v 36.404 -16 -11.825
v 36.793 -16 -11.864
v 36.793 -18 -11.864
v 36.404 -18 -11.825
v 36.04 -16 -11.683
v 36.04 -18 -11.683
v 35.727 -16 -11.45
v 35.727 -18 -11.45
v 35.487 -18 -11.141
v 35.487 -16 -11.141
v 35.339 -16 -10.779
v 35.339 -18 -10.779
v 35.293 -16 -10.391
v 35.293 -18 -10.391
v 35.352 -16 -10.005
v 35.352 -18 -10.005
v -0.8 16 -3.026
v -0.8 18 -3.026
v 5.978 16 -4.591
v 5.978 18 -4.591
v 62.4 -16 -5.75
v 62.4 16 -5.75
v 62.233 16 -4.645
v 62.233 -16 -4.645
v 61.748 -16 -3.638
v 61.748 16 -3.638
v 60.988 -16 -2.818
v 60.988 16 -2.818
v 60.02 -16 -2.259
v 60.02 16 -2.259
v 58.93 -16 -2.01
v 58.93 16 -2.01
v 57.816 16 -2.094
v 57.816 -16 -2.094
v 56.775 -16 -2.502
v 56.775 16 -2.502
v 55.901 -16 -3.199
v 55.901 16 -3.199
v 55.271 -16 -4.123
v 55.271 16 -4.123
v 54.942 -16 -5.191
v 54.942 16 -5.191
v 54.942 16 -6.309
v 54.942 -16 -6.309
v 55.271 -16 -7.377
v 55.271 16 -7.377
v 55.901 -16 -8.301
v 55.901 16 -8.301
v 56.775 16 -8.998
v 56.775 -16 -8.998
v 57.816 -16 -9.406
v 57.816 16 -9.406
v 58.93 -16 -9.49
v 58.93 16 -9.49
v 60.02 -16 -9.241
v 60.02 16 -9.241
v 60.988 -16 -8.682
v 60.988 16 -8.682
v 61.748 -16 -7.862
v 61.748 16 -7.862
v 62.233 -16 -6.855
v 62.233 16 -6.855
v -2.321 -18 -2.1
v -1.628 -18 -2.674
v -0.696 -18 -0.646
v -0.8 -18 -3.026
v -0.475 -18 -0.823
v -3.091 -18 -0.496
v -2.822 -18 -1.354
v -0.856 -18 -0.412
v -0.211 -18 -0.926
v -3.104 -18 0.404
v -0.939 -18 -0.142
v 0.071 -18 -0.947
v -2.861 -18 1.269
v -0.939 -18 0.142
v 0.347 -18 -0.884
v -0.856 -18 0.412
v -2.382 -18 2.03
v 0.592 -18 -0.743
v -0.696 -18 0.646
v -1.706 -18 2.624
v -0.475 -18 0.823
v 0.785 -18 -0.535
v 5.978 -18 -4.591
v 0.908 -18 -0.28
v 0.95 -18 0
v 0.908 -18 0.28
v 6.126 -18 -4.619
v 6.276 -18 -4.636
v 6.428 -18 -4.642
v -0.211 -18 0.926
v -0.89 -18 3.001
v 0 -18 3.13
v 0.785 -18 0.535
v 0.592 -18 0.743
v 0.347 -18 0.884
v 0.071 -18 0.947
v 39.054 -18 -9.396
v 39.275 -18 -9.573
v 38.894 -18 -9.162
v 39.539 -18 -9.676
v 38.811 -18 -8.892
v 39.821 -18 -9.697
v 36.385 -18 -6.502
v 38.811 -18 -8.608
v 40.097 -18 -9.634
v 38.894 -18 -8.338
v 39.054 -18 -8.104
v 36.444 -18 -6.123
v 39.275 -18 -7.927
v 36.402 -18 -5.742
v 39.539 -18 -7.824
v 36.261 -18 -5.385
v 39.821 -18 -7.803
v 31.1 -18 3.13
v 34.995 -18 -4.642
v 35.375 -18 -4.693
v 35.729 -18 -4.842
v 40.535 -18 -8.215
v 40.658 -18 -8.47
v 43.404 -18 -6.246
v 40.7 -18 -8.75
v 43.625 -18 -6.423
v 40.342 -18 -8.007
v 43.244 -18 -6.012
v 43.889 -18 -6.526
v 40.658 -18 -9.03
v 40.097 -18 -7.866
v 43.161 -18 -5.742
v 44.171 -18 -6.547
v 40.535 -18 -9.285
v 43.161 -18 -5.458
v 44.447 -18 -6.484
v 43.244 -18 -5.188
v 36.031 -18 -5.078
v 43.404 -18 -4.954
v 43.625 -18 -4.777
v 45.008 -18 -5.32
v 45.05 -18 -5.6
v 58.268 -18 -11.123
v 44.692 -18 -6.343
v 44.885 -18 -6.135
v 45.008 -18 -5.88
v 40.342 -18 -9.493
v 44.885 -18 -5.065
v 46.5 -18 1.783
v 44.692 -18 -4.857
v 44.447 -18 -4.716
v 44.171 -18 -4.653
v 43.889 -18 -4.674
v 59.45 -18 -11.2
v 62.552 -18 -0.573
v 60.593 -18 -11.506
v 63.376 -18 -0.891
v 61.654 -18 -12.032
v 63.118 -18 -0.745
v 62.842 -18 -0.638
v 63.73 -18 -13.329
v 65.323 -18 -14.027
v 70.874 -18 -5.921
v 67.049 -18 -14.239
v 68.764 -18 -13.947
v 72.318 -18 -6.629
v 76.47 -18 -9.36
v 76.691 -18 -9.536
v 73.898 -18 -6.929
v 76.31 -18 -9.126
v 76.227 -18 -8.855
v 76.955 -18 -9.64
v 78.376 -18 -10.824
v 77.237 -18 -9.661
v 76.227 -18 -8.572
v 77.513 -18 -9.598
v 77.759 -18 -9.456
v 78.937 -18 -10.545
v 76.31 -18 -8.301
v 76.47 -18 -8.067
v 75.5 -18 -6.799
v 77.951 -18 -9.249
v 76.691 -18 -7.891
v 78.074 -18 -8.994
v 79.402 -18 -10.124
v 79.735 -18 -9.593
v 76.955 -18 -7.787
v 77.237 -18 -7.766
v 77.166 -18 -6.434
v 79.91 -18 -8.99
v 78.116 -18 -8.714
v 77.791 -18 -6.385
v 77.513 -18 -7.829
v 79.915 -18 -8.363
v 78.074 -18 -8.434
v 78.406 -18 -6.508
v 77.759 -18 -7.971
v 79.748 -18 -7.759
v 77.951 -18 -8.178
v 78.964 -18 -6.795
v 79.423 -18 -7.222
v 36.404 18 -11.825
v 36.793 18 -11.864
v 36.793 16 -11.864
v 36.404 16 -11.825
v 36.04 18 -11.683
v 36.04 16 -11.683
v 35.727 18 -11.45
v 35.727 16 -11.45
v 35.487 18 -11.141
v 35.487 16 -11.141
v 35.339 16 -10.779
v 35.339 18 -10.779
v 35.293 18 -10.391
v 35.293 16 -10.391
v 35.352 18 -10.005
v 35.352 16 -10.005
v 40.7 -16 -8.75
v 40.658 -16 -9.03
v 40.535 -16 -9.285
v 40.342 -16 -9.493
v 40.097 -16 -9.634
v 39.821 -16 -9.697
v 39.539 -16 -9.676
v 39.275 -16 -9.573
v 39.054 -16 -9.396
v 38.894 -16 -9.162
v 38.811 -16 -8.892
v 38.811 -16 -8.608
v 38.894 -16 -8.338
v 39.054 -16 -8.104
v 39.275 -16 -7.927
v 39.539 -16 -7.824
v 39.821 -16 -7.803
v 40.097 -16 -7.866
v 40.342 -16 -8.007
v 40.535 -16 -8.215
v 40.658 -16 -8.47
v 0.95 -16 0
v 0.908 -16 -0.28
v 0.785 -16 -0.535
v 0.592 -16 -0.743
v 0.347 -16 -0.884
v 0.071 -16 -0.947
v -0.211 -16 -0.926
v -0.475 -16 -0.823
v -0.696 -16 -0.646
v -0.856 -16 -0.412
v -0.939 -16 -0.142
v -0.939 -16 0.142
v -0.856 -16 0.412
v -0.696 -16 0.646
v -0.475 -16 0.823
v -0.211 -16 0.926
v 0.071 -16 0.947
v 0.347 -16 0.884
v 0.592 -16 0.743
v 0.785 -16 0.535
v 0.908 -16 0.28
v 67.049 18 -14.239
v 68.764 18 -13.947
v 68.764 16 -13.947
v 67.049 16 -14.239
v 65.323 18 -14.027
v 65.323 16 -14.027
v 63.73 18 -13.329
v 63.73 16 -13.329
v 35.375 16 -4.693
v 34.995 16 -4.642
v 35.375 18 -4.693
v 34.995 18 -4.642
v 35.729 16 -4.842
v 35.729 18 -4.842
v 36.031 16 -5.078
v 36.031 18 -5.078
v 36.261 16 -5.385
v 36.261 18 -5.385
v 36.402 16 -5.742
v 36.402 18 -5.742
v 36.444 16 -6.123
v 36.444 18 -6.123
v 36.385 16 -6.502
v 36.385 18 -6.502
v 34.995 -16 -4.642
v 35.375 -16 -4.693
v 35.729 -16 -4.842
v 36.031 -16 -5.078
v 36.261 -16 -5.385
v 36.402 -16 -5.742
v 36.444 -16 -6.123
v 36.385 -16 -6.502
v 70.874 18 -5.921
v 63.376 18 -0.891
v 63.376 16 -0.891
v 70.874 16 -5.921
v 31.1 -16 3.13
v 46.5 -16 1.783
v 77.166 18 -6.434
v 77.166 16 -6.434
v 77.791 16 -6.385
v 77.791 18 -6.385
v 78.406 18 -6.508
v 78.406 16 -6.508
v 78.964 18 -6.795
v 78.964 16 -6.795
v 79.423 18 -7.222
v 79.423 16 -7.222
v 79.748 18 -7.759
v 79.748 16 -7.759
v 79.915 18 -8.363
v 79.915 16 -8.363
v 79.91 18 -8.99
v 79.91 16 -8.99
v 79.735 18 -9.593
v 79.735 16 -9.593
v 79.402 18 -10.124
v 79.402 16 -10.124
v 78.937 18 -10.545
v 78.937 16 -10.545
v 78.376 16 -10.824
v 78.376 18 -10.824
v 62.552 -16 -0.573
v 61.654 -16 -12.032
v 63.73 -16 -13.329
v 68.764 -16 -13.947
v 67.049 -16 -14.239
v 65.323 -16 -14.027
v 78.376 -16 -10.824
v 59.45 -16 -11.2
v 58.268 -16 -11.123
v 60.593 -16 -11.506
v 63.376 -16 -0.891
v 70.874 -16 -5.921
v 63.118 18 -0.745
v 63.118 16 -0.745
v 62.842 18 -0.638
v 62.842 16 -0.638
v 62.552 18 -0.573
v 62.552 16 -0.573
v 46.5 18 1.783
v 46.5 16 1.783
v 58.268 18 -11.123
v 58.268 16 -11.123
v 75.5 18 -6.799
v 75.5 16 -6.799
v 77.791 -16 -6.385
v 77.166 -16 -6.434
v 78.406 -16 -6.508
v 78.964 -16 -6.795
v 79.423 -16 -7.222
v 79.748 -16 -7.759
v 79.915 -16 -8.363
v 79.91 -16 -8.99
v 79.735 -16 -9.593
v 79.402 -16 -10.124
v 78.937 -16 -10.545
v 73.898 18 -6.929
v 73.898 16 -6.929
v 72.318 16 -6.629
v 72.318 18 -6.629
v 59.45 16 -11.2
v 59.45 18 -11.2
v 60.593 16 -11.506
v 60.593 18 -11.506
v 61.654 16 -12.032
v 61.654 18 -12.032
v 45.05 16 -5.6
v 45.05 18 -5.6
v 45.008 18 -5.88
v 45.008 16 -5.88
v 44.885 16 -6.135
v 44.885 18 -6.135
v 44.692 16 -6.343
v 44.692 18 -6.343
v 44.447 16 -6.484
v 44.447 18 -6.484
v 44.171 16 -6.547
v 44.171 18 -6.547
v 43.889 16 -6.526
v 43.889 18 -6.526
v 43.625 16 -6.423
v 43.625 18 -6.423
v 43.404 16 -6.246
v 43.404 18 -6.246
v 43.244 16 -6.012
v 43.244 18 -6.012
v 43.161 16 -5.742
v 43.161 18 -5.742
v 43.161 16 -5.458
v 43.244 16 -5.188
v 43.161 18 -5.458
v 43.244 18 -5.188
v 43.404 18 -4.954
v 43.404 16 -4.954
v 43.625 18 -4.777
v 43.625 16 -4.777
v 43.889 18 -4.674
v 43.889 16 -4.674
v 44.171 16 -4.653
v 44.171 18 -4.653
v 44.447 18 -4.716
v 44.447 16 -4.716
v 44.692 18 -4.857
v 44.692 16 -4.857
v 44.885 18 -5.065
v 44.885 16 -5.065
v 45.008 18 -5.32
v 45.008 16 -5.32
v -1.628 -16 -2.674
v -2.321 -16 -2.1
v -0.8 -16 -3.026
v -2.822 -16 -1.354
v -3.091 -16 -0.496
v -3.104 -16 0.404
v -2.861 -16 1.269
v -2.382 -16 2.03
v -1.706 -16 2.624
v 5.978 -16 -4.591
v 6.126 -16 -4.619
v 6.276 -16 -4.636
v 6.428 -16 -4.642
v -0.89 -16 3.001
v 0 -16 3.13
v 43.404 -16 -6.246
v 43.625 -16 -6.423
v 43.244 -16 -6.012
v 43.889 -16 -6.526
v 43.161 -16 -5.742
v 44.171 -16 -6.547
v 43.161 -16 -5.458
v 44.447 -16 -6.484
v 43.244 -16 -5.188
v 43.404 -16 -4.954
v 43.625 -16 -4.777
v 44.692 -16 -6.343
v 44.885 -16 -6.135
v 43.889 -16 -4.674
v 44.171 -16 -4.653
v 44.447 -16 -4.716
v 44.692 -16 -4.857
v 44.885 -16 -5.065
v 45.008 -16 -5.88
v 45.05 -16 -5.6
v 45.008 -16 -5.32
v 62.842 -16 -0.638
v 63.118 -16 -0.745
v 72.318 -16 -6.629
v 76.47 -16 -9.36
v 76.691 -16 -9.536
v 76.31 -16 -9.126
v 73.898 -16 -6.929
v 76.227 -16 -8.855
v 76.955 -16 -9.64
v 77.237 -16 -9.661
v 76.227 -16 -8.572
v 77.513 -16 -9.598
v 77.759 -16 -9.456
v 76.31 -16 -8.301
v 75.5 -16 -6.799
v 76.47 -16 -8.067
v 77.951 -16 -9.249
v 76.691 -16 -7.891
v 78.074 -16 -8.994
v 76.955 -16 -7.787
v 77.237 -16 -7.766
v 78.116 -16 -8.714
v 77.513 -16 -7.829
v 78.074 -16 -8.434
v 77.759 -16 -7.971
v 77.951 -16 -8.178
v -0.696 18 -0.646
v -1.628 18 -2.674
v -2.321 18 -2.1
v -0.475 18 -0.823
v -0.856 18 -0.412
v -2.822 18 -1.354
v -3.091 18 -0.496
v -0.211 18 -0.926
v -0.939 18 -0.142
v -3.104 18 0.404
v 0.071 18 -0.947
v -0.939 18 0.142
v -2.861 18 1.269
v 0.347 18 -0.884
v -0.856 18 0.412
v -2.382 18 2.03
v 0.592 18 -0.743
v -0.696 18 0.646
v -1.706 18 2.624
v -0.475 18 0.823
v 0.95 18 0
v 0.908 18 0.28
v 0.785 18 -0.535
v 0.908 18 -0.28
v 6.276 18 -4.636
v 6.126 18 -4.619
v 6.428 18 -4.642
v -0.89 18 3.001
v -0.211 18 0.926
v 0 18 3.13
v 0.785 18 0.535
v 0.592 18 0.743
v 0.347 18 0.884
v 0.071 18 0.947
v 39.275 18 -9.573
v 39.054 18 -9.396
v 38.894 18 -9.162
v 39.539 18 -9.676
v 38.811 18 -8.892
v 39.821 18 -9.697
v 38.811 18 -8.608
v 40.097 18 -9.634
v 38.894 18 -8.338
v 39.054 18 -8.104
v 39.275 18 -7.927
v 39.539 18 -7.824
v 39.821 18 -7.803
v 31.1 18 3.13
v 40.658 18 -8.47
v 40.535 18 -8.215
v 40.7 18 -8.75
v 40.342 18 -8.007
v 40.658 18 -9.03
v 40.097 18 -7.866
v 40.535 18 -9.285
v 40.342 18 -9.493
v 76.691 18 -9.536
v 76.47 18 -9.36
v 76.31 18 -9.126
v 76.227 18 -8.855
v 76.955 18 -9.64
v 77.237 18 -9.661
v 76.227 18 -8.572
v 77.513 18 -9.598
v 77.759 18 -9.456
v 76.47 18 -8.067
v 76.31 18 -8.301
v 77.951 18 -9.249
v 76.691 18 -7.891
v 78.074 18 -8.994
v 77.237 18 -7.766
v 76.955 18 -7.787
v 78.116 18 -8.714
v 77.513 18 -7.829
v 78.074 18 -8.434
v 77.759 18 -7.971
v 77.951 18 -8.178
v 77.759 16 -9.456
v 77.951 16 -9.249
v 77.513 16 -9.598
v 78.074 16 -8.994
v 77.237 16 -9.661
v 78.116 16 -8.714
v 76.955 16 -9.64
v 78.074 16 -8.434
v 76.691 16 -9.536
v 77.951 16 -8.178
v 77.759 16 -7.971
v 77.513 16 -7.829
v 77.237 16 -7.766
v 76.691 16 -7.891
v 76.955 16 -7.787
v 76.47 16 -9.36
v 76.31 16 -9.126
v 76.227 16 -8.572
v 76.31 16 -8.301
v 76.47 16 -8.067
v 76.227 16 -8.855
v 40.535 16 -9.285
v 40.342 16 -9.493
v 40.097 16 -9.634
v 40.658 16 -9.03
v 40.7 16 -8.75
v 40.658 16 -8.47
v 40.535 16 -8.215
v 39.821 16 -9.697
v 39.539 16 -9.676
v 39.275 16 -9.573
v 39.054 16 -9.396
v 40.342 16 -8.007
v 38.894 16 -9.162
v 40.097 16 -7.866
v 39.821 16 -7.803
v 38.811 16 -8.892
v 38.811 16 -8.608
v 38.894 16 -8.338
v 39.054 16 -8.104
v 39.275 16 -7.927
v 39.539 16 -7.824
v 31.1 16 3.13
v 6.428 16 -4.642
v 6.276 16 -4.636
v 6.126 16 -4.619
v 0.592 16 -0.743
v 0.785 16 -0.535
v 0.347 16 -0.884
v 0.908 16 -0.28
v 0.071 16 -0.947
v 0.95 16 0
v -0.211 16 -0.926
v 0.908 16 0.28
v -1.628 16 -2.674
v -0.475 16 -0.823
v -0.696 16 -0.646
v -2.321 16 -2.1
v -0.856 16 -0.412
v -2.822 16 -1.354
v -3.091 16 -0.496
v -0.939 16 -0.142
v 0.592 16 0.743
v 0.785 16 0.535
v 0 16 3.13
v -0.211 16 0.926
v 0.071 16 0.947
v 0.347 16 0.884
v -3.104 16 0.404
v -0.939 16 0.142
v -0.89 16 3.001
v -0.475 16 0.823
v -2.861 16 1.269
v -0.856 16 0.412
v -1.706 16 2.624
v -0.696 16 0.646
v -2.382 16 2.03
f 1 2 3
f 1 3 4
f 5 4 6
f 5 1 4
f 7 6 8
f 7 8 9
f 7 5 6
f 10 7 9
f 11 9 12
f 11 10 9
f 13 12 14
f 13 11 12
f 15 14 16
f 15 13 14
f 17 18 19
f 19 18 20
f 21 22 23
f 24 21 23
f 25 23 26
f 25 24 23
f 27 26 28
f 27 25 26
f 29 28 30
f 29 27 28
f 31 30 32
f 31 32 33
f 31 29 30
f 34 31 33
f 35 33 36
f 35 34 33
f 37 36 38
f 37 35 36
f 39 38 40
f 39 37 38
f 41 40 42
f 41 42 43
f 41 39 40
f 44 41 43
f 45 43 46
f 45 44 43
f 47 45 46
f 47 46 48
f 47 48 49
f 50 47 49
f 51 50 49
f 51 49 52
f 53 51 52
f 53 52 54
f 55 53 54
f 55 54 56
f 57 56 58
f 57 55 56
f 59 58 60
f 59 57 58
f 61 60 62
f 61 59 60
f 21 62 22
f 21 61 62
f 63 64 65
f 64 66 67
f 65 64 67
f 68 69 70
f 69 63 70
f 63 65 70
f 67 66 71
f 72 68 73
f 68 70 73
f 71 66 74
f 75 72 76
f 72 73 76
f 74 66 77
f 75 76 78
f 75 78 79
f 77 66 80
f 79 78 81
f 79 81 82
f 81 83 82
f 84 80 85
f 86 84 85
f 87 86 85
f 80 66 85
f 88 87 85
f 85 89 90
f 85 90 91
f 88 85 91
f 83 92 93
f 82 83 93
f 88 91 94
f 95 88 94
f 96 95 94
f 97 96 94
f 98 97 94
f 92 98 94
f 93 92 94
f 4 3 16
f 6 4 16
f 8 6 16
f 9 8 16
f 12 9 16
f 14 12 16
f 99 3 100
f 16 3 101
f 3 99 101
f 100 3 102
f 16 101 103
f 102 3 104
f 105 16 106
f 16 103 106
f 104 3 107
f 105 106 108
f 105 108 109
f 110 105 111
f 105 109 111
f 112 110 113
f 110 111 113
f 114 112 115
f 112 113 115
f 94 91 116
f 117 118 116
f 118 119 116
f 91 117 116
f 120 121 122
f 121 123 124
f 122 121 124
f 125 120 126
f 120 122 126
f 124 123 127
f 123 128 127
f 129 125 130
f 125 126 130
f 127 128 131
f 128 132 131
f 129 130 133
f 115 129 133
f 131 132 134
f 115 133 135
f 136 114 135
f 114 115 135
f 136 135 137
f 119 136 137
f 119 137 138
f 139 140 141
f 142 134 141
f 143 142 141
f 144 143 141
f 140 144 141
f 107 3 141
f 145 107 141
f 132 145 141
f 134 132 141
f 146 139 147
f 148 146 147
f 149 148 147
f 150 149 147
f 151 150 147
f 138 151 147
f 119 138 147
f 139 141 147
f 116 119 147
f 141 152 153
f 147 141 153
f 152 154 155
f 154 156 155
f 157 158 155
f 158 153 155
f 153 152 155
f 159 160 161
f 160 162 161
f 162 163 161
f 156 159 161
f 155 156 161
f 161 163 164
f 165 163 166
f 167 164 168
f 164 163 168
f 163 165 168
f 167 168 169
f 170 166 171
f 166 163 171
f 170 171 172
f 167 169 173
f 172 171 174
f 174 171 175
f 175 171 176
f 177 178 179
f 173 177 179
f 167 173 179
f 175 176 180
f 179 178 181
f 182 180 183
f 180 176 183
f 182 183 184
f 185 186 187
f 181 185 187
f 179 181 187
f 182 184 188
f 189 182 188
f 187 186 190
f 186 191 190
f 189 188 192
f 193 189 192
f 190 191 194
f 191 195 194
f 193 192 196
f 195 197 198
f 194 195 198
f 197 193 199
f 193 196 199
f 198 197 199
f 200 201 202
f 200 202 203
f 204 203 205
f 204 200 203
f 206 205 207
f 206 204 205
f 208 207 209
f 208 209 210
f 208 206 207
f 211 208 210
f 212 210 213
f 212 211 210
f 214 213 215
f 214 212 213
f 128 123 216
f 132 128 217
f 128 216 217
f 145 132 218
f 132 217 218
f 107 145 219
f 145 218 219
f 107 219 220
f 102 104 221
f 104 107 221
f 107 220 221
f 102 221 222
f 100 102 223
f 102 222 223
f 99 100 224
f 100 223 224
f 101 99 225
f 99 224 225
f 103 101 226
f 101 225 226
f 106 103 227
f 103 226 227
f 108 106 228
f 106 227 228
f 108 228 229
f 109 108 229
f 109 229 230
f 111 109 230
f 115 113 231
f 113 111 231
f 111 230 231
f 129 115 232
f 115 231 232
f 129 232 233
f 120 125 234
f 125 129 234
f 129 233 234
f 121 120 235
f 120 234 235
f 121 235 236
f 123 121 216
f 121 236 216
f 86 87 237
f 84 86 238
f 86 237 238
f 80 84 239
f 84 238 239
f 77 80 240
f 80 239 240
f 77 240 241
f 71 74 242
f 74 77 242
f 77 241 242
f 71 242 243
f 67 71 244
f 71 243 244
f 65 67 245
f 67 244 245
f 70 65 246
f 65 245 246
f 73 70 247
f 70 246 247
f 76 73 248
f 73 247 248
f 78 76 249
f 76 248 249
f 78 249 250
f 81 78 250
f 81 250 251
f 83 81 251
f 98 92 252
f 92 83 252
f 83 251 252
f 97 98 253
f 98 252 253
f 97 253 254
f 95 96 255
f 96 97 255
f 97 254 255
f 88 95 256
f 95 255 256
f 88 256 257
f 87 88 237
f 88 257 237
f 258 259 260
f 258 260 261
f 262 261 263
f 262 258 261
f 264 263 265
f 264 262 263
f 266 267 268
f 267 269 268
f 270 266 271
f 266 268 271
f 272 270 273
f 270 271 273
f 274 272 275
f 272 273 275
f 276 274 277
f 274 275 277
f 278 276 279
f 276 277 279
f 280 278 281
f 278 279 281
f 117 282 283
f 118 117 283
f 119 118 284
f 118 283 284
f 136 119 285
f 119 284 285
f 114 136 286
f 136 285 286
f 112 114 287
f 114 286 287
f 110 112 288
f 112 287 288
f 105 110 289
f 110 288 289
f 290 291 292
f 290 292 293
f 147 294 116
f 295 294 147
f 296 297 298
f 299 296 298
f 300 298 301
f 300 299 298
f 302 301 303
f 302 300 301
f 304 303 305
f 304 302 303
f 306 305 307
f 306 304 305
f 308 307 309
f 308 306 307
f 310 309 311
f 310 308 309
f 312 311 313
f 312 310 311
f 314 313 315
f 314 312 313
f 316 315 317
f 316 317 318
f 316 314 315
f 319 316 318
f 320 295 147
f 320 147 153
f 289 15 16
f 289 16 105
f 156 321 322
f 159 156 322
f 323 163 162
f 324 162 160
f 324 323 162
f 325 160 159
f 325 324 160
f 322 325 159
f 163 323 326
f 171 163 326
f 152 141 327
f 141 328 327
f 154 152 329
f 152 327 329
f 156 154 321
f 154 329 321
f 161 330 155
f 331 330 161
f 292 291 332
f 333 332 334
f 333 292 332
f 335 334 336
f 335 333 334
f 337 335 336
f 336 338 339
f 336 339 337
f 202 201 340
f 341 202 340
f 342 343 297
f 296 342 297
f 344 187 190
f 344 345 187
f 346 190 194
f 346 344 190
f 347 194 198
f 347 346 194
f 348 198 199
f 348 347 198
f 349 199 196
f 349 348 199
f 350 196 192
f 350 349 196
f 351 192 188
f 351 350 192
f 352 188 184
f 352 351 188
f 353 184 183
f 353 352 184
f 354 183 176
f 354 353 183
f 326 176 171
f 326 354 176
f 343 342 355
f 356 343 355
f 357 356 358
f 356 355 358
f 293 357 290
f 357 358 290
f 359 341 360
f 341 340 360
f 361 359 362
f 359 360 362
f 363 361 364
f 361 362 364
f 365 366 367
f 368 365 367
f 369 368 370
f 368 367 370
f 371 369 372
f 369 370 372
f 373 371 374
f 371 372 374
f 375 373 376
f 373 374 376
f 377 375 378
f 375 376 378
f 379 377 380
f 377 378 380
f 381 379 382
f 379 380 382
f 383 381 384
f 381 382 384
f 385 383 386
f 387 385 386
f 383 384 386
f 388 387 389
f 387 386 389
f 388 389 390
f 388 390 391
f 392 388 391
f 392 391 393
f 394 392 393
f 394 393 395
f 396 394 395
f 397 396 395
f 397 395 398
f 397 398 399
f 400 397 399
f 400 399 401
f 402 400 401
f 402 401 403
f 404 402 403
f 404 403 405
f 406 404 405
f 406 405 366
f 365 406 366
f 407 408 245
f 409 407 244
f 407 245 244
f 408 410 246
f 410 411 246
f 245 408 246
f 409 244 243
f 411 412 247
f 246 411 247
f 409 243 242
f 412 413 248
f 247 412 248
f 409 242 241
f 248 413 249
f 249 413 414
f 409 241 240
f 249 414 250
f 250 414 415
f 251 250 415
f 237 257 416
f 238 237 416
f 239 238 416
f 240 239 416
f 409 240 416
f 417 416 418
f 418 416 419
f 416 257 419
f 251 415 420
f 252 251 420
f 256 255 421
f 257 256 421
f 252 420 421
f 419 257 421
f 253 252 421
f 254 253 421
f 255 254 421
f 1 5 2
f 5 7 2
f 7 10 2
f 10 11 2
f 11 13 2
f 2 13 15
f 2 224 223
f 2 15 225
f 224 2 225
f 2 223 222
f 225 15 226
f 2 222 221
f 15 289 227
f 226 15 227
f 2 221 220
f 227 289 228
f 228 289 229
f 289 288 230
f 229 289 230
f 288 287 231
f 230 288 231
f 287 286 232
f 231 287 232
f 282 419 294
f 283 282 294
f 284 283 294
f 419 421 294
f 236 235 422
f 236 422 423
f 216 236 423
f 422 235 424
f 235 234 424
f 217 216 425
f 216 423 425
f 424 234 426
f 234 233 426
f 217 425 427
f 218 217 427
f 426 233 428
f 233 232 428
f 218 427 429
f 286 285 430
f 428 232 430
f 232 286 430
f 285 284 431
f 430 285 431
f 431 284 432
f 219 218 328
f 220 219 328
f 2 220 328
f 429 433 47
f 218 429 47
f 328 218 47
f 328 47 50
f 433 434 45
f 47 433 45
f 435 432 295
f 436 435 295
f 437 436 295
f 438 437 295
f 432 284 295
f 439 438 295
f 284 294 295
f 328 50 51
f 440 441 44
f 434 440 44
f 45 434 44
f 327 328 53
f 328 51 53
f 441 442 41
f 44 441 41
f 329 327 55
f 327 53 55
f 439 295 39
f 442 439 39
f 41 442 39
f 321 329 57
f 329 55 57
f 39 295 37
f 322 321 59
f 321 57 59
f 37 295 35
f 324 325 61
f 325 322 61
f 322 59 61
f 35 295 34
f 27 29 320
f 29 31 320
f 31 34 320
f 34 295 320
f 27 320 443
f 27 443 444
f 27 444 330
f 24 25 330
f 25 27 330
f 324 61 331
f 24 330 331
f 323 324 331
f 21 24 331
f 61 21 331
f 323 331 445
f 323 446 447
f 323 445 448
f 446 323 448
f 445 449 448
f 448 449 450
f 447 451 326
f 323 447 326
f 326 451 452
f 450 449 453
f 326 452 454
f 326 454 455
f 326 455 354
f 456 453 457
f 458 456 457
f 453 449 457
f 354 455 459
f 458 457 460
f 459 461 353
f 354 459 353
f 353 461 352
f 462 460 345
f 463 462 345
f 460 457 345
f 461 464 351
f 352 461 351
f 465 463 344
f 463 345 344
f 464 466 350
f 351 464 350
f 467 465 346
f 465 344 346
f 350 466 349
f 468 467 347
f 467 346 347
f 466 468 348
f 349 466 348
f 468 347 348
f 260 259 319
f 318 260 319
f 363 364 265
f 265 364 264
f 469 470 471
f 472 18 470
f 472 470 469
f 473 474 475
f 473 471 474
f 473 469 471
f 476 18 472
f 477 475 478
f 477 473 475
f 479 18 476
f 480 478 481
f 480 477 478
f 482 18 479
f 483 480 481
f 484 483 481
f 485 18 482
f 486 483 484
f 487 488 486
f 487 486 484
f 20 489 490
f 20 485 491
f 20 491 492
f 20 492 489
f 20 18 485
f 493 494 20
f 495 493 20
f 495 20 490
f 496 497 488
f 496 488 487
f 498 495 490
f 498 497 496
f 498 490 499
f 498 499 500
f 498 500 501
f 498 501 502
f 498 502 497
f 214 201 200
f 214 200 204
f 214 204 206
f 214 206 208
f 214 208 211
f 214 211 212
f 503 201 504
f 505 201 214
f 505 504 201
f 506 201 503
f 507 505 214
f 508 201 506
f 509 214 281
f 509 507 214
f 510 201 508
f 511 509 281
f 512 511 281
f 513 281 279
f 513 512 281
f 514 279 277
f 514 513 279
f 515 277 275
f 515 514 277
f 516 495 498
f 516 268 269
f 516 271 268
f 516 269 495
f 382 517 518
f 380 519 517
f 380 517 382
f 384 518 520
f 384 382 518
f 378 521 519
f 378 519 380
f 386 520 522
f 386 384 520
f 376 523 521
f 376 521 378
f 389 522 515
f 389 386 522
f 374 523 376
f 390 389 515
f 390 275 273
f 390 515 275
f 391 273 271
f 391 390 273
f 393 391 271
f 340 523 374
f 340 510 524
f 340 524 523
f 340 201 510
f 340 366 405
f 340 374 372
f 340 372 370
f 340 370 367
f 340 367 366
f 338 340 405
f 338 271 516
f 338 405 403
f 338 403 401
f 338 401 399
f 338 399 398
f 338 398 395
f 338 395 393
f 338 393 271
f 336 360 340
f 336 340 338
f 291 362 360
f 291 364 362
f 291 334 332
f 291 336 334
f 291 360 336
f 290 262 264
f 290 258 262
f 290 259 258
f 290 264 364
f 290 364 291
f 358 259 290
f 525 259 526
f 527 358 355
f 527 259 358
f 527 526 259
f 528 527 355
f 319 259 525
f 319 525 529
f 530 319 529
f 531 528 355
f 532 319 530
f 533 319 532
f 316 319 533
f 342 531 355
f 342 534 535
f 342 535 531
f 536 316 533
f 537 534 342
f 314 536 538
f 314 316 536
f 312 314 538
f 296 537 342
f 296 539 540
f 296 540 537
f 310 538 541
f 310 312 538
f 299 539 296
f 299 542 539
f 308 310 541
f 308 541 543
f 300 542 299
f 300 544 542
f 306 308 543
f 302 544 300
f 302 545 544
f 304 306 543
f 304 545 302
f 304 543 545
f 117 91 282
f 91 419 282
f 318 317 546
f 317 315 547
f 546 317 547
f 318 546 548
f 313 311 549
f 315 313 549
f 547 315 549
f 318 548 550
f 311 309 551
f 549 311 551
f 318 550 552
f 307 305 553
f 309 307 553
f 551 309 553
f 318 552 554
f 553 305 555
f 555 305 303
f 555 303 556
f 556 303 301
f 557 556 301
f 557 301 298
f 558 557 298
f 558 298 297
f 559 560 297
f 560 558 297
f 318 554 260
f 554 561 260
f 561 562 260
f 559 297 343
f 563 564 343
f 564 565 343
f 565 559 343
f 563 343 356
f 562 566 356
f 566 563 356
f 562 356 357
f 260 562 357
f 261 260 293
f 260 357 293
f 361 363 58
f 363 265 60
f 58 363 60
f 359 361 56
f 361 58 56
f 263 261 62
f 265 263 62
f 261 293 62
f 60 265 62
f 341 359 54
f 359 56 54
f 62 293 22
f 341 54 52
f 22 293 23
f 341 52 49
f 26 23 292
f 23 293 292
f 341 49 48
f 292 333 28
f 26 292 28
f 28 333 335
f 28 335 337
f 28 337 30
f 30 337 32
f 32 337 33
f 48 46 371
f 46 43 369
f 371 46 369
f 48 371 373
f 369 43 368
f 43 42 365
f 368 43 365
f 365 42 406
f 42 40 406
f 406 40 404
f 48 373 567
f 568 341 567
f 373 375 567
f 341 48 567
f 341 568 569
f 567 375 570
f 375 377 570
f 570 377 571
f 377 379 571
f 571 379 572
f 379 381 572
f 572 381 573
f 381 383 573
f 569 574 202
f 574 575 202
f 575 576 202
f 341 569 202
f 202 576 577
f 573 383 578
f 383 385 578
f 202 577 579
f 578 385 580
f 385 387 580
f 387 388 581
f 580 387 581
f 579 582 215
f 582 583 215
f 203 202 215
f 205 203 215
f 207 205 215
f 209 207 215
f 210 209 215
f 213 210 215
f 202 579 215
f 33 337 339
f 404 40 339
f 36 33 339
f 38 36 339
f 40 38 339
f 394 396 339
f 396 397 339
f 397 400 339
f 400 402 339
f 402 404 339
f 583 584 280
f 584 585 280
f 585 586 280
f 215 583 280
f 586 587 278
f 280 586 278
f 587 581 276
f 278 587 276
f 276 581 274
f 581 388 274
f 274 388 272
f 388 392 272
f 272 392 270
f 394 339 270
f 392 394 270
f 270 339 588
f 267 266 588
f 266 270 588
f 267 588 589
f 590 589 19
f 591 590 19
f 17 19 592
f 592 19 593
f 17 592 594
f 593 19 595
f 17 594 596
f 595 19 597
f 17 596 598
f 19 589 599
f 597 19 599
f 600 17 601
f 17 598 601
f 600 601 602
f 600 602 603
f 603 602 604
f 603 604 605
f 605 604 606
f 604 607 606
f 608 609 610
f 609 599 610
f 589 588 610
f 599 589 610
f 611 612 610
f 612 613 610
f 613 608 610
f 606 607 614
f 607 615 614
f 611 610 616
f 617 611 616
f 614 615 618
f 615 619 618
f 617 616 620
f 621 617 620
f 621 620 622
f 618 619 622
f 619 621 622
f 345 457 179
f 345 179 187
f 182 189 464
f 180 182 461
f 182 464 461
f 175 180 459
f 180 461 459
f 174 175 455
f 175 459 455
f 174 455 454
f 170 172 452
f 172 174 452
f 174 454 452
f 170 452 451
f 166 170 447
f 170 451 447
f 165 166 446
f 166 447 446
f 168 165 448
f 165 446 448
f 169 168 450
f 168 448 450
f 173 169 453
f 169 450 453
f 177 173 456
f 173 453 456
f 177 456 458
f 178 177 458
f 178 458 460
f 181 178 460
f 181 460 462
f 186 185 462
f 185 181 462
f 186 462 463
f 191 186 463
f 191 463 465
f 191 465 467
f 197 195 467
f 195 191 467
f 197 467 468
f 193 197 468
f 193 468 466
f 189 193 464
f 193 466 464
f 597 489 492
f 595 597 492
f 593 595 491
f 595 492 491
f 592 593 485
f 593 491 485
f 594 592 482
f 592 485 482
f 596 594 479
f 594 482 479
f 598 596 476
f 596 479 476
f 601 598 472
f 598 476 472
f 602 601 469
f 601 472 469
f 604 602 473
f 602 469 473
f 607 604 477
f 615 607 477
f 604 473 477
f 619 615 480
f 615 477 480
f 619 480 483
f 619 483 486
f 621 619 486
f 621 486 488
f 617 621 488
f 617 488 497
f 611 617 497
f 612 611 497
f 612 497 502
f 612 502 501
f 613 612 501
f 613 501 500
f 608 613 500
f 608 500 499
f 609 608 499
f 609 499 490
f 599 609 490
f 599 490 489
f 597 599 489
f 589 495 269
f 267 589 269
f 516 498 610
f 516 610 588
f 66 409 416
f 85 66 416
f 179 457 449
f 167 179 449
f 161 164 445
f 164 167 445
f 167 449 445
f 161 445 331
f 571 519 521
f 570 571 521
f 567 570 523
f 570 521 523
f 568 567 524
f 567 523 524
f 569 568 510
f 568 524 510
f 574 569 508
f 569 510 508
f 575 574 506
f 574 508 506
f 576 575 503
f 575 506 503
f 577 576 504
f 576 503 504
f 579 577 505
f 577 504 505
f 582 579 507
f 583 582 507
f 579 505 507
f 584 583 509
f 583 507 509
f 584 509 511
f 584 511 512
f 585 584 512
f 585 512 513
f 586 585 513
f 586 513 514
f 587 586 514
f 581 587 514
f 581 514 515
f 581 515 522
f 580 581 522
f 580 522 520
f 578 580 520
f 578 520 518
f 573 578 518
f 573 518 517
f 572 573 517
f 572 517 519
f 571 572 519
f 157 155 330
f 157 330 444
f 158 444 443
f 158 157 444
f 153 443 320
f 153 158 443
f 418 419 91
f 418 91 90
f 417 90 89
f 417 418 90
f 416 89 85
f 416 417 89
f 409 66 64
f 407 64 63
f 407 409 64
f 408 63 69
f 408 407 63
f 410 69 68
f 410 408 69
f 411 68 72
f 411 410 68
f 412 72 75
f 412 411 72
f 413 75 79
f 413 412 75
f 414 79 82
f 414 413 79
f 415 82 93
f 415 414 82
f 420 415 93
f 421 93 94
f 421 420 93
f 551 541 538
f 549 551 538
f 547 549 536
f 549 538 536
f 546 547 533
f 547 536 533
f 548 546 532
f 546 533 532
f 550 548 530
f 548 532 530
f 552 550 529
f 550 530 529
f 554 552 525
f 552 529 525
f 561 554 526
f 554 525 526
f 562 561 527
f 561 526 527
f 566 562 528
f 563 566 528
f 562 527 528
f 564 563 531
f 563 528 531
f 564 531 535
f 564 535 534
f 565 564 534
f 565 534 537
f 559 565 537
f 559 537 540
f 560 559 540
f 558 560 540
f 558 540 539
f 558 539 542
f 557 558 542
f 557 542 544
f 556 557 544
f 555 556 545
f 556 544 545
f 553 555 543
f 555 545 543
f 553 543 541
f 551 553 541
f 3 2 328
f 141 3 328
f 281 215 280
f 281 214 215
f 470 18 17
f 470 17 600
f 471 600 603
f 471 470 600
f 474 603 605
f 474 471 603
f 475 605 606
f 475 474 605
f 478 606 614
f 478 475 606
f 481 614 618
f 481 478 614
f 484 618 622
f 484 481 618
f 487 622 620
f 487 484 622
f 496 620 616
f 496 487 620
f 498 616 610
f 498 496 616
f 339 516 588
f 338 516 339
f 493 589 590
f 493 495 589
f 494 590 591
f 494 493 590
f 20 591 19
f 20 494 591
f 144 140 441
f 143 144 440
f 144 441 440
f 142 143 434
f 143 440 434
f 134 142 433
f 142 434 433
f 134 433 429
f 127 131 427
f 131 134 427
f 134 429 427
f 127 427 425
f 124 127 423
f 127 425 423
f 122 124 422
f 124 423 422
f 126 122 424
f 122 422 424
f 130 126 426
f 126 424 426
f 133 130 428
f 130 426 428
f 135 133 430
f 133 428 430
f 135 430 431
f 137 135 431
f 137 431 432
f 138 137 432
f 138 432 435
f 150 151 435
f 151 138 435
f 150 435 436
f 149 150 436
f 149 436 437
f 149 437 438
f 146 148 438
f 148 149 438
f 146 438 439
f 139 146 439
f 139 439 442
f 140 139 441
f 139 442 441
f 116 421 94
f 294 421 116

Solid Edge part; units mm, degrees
sketch "Sketch1" plane through (0, 0, 0) normal (0, -1, 0) x (1, 0, 0)
  line L0 (63, -0.6391) -> (70.8743, -5.9205)
  arc A0 (70.8743, -5.9205) -> (75.5003, -6.7985) centre (74.2164, -0.9375) ccw
  line L1 (75.5003, -6.7985) -> (77.1662, -6.4336)
  arc A1 (77.1662, -6.4336) -> (78.3755, -10.8236) centre (77.654, -8.6608) cw
  line L2 (68.7638, -13.9467) -> (78.3755, -10.8236)
  arc A2 (63.7302, -13.3286) -> (68.7638, -13.9467) centre (66.9097, -8.2403) ccw
  line L3 (61.6545, -12.0316) -> (63.7302, -13.3286)
  arc A3 (58.2681, -11.1234) -> (61.6545, -12.0316) centre (58.4749, -17.1199) cw
  line L4 (36.7927, -11.8642) -> (58.2681, -11.1234)
  arc A4 (36.7927, -11.8642) -> (35.352, -10.0047) centre (36.7427, -10.4151) cw
  line L5 (35.352, -10.0047) -> (36.3854, -6.5024)
  arc A5 (34.9947, -4.642) -> (36.3854, -6.5024) centre (34.9947, -6.092) cw
  line L6 (6.1997, -4.642) -> (34.9947, -4.642)
  line L7 (-0.8003, -3.026) -> (6.1997, -4.642)
  arc A6 (0, 3.13) -> (-0.8003, -3.026) centre (0, 0) ccw
  line L8 (0, 3.13) -> (31.1, 3.13)
  line L9 (31.1, 3.13) -> (46.5, 1.7827)
  line L10 (46.5, 1.7827) -> (63, -0.6391)
  circle A7 centre (44.1, -5.6) radius 0.95
  circle A8 centre (39.75, -8.75) radius 0.95
  circle A9 centre (77.1662, -8.7136) radius 0.95
  circle A10 centre (0, 0) radius 0.95
extrude "Protrusion1" add sketch "Sketch1" along normal mid plane 36
fillet "Round_1" radius 2 4 edges at (31.1, 0, 3.13) (46.5, 0, 1.7827) (63, 0, -0.6391) (6.1997, 0, -4.642)
sketch "Sketch2" plane through (15.5063, 0, 3.13) normal (0, 0, 1) x (-1, 0, 0)
  line L0 (25.1795, 16) -> (-74.8205, 16)
  line L1 (-74.8205, 16) -> (-74.8205, -16)
  line L2 (-74.8205, -16) -> (25.1795, -16)
  line L3 (25.1795, -16) -> (25.1795, 16)
extrude "Cutout1" cut sketch "Sketch2" against normal through all
sketch "Sketch3" plane through (38.402, -18, -5.5552) normal (0, -1, 0) x (1, 0, 0)
  circle A0 centre (20.248, -0.1948) radius 3.75
extrude "Protrusion2" add sketch "Sketch3" against normal up to surface (32 mm away) from surface at -2
properties material "Stainless Steel, 420"
